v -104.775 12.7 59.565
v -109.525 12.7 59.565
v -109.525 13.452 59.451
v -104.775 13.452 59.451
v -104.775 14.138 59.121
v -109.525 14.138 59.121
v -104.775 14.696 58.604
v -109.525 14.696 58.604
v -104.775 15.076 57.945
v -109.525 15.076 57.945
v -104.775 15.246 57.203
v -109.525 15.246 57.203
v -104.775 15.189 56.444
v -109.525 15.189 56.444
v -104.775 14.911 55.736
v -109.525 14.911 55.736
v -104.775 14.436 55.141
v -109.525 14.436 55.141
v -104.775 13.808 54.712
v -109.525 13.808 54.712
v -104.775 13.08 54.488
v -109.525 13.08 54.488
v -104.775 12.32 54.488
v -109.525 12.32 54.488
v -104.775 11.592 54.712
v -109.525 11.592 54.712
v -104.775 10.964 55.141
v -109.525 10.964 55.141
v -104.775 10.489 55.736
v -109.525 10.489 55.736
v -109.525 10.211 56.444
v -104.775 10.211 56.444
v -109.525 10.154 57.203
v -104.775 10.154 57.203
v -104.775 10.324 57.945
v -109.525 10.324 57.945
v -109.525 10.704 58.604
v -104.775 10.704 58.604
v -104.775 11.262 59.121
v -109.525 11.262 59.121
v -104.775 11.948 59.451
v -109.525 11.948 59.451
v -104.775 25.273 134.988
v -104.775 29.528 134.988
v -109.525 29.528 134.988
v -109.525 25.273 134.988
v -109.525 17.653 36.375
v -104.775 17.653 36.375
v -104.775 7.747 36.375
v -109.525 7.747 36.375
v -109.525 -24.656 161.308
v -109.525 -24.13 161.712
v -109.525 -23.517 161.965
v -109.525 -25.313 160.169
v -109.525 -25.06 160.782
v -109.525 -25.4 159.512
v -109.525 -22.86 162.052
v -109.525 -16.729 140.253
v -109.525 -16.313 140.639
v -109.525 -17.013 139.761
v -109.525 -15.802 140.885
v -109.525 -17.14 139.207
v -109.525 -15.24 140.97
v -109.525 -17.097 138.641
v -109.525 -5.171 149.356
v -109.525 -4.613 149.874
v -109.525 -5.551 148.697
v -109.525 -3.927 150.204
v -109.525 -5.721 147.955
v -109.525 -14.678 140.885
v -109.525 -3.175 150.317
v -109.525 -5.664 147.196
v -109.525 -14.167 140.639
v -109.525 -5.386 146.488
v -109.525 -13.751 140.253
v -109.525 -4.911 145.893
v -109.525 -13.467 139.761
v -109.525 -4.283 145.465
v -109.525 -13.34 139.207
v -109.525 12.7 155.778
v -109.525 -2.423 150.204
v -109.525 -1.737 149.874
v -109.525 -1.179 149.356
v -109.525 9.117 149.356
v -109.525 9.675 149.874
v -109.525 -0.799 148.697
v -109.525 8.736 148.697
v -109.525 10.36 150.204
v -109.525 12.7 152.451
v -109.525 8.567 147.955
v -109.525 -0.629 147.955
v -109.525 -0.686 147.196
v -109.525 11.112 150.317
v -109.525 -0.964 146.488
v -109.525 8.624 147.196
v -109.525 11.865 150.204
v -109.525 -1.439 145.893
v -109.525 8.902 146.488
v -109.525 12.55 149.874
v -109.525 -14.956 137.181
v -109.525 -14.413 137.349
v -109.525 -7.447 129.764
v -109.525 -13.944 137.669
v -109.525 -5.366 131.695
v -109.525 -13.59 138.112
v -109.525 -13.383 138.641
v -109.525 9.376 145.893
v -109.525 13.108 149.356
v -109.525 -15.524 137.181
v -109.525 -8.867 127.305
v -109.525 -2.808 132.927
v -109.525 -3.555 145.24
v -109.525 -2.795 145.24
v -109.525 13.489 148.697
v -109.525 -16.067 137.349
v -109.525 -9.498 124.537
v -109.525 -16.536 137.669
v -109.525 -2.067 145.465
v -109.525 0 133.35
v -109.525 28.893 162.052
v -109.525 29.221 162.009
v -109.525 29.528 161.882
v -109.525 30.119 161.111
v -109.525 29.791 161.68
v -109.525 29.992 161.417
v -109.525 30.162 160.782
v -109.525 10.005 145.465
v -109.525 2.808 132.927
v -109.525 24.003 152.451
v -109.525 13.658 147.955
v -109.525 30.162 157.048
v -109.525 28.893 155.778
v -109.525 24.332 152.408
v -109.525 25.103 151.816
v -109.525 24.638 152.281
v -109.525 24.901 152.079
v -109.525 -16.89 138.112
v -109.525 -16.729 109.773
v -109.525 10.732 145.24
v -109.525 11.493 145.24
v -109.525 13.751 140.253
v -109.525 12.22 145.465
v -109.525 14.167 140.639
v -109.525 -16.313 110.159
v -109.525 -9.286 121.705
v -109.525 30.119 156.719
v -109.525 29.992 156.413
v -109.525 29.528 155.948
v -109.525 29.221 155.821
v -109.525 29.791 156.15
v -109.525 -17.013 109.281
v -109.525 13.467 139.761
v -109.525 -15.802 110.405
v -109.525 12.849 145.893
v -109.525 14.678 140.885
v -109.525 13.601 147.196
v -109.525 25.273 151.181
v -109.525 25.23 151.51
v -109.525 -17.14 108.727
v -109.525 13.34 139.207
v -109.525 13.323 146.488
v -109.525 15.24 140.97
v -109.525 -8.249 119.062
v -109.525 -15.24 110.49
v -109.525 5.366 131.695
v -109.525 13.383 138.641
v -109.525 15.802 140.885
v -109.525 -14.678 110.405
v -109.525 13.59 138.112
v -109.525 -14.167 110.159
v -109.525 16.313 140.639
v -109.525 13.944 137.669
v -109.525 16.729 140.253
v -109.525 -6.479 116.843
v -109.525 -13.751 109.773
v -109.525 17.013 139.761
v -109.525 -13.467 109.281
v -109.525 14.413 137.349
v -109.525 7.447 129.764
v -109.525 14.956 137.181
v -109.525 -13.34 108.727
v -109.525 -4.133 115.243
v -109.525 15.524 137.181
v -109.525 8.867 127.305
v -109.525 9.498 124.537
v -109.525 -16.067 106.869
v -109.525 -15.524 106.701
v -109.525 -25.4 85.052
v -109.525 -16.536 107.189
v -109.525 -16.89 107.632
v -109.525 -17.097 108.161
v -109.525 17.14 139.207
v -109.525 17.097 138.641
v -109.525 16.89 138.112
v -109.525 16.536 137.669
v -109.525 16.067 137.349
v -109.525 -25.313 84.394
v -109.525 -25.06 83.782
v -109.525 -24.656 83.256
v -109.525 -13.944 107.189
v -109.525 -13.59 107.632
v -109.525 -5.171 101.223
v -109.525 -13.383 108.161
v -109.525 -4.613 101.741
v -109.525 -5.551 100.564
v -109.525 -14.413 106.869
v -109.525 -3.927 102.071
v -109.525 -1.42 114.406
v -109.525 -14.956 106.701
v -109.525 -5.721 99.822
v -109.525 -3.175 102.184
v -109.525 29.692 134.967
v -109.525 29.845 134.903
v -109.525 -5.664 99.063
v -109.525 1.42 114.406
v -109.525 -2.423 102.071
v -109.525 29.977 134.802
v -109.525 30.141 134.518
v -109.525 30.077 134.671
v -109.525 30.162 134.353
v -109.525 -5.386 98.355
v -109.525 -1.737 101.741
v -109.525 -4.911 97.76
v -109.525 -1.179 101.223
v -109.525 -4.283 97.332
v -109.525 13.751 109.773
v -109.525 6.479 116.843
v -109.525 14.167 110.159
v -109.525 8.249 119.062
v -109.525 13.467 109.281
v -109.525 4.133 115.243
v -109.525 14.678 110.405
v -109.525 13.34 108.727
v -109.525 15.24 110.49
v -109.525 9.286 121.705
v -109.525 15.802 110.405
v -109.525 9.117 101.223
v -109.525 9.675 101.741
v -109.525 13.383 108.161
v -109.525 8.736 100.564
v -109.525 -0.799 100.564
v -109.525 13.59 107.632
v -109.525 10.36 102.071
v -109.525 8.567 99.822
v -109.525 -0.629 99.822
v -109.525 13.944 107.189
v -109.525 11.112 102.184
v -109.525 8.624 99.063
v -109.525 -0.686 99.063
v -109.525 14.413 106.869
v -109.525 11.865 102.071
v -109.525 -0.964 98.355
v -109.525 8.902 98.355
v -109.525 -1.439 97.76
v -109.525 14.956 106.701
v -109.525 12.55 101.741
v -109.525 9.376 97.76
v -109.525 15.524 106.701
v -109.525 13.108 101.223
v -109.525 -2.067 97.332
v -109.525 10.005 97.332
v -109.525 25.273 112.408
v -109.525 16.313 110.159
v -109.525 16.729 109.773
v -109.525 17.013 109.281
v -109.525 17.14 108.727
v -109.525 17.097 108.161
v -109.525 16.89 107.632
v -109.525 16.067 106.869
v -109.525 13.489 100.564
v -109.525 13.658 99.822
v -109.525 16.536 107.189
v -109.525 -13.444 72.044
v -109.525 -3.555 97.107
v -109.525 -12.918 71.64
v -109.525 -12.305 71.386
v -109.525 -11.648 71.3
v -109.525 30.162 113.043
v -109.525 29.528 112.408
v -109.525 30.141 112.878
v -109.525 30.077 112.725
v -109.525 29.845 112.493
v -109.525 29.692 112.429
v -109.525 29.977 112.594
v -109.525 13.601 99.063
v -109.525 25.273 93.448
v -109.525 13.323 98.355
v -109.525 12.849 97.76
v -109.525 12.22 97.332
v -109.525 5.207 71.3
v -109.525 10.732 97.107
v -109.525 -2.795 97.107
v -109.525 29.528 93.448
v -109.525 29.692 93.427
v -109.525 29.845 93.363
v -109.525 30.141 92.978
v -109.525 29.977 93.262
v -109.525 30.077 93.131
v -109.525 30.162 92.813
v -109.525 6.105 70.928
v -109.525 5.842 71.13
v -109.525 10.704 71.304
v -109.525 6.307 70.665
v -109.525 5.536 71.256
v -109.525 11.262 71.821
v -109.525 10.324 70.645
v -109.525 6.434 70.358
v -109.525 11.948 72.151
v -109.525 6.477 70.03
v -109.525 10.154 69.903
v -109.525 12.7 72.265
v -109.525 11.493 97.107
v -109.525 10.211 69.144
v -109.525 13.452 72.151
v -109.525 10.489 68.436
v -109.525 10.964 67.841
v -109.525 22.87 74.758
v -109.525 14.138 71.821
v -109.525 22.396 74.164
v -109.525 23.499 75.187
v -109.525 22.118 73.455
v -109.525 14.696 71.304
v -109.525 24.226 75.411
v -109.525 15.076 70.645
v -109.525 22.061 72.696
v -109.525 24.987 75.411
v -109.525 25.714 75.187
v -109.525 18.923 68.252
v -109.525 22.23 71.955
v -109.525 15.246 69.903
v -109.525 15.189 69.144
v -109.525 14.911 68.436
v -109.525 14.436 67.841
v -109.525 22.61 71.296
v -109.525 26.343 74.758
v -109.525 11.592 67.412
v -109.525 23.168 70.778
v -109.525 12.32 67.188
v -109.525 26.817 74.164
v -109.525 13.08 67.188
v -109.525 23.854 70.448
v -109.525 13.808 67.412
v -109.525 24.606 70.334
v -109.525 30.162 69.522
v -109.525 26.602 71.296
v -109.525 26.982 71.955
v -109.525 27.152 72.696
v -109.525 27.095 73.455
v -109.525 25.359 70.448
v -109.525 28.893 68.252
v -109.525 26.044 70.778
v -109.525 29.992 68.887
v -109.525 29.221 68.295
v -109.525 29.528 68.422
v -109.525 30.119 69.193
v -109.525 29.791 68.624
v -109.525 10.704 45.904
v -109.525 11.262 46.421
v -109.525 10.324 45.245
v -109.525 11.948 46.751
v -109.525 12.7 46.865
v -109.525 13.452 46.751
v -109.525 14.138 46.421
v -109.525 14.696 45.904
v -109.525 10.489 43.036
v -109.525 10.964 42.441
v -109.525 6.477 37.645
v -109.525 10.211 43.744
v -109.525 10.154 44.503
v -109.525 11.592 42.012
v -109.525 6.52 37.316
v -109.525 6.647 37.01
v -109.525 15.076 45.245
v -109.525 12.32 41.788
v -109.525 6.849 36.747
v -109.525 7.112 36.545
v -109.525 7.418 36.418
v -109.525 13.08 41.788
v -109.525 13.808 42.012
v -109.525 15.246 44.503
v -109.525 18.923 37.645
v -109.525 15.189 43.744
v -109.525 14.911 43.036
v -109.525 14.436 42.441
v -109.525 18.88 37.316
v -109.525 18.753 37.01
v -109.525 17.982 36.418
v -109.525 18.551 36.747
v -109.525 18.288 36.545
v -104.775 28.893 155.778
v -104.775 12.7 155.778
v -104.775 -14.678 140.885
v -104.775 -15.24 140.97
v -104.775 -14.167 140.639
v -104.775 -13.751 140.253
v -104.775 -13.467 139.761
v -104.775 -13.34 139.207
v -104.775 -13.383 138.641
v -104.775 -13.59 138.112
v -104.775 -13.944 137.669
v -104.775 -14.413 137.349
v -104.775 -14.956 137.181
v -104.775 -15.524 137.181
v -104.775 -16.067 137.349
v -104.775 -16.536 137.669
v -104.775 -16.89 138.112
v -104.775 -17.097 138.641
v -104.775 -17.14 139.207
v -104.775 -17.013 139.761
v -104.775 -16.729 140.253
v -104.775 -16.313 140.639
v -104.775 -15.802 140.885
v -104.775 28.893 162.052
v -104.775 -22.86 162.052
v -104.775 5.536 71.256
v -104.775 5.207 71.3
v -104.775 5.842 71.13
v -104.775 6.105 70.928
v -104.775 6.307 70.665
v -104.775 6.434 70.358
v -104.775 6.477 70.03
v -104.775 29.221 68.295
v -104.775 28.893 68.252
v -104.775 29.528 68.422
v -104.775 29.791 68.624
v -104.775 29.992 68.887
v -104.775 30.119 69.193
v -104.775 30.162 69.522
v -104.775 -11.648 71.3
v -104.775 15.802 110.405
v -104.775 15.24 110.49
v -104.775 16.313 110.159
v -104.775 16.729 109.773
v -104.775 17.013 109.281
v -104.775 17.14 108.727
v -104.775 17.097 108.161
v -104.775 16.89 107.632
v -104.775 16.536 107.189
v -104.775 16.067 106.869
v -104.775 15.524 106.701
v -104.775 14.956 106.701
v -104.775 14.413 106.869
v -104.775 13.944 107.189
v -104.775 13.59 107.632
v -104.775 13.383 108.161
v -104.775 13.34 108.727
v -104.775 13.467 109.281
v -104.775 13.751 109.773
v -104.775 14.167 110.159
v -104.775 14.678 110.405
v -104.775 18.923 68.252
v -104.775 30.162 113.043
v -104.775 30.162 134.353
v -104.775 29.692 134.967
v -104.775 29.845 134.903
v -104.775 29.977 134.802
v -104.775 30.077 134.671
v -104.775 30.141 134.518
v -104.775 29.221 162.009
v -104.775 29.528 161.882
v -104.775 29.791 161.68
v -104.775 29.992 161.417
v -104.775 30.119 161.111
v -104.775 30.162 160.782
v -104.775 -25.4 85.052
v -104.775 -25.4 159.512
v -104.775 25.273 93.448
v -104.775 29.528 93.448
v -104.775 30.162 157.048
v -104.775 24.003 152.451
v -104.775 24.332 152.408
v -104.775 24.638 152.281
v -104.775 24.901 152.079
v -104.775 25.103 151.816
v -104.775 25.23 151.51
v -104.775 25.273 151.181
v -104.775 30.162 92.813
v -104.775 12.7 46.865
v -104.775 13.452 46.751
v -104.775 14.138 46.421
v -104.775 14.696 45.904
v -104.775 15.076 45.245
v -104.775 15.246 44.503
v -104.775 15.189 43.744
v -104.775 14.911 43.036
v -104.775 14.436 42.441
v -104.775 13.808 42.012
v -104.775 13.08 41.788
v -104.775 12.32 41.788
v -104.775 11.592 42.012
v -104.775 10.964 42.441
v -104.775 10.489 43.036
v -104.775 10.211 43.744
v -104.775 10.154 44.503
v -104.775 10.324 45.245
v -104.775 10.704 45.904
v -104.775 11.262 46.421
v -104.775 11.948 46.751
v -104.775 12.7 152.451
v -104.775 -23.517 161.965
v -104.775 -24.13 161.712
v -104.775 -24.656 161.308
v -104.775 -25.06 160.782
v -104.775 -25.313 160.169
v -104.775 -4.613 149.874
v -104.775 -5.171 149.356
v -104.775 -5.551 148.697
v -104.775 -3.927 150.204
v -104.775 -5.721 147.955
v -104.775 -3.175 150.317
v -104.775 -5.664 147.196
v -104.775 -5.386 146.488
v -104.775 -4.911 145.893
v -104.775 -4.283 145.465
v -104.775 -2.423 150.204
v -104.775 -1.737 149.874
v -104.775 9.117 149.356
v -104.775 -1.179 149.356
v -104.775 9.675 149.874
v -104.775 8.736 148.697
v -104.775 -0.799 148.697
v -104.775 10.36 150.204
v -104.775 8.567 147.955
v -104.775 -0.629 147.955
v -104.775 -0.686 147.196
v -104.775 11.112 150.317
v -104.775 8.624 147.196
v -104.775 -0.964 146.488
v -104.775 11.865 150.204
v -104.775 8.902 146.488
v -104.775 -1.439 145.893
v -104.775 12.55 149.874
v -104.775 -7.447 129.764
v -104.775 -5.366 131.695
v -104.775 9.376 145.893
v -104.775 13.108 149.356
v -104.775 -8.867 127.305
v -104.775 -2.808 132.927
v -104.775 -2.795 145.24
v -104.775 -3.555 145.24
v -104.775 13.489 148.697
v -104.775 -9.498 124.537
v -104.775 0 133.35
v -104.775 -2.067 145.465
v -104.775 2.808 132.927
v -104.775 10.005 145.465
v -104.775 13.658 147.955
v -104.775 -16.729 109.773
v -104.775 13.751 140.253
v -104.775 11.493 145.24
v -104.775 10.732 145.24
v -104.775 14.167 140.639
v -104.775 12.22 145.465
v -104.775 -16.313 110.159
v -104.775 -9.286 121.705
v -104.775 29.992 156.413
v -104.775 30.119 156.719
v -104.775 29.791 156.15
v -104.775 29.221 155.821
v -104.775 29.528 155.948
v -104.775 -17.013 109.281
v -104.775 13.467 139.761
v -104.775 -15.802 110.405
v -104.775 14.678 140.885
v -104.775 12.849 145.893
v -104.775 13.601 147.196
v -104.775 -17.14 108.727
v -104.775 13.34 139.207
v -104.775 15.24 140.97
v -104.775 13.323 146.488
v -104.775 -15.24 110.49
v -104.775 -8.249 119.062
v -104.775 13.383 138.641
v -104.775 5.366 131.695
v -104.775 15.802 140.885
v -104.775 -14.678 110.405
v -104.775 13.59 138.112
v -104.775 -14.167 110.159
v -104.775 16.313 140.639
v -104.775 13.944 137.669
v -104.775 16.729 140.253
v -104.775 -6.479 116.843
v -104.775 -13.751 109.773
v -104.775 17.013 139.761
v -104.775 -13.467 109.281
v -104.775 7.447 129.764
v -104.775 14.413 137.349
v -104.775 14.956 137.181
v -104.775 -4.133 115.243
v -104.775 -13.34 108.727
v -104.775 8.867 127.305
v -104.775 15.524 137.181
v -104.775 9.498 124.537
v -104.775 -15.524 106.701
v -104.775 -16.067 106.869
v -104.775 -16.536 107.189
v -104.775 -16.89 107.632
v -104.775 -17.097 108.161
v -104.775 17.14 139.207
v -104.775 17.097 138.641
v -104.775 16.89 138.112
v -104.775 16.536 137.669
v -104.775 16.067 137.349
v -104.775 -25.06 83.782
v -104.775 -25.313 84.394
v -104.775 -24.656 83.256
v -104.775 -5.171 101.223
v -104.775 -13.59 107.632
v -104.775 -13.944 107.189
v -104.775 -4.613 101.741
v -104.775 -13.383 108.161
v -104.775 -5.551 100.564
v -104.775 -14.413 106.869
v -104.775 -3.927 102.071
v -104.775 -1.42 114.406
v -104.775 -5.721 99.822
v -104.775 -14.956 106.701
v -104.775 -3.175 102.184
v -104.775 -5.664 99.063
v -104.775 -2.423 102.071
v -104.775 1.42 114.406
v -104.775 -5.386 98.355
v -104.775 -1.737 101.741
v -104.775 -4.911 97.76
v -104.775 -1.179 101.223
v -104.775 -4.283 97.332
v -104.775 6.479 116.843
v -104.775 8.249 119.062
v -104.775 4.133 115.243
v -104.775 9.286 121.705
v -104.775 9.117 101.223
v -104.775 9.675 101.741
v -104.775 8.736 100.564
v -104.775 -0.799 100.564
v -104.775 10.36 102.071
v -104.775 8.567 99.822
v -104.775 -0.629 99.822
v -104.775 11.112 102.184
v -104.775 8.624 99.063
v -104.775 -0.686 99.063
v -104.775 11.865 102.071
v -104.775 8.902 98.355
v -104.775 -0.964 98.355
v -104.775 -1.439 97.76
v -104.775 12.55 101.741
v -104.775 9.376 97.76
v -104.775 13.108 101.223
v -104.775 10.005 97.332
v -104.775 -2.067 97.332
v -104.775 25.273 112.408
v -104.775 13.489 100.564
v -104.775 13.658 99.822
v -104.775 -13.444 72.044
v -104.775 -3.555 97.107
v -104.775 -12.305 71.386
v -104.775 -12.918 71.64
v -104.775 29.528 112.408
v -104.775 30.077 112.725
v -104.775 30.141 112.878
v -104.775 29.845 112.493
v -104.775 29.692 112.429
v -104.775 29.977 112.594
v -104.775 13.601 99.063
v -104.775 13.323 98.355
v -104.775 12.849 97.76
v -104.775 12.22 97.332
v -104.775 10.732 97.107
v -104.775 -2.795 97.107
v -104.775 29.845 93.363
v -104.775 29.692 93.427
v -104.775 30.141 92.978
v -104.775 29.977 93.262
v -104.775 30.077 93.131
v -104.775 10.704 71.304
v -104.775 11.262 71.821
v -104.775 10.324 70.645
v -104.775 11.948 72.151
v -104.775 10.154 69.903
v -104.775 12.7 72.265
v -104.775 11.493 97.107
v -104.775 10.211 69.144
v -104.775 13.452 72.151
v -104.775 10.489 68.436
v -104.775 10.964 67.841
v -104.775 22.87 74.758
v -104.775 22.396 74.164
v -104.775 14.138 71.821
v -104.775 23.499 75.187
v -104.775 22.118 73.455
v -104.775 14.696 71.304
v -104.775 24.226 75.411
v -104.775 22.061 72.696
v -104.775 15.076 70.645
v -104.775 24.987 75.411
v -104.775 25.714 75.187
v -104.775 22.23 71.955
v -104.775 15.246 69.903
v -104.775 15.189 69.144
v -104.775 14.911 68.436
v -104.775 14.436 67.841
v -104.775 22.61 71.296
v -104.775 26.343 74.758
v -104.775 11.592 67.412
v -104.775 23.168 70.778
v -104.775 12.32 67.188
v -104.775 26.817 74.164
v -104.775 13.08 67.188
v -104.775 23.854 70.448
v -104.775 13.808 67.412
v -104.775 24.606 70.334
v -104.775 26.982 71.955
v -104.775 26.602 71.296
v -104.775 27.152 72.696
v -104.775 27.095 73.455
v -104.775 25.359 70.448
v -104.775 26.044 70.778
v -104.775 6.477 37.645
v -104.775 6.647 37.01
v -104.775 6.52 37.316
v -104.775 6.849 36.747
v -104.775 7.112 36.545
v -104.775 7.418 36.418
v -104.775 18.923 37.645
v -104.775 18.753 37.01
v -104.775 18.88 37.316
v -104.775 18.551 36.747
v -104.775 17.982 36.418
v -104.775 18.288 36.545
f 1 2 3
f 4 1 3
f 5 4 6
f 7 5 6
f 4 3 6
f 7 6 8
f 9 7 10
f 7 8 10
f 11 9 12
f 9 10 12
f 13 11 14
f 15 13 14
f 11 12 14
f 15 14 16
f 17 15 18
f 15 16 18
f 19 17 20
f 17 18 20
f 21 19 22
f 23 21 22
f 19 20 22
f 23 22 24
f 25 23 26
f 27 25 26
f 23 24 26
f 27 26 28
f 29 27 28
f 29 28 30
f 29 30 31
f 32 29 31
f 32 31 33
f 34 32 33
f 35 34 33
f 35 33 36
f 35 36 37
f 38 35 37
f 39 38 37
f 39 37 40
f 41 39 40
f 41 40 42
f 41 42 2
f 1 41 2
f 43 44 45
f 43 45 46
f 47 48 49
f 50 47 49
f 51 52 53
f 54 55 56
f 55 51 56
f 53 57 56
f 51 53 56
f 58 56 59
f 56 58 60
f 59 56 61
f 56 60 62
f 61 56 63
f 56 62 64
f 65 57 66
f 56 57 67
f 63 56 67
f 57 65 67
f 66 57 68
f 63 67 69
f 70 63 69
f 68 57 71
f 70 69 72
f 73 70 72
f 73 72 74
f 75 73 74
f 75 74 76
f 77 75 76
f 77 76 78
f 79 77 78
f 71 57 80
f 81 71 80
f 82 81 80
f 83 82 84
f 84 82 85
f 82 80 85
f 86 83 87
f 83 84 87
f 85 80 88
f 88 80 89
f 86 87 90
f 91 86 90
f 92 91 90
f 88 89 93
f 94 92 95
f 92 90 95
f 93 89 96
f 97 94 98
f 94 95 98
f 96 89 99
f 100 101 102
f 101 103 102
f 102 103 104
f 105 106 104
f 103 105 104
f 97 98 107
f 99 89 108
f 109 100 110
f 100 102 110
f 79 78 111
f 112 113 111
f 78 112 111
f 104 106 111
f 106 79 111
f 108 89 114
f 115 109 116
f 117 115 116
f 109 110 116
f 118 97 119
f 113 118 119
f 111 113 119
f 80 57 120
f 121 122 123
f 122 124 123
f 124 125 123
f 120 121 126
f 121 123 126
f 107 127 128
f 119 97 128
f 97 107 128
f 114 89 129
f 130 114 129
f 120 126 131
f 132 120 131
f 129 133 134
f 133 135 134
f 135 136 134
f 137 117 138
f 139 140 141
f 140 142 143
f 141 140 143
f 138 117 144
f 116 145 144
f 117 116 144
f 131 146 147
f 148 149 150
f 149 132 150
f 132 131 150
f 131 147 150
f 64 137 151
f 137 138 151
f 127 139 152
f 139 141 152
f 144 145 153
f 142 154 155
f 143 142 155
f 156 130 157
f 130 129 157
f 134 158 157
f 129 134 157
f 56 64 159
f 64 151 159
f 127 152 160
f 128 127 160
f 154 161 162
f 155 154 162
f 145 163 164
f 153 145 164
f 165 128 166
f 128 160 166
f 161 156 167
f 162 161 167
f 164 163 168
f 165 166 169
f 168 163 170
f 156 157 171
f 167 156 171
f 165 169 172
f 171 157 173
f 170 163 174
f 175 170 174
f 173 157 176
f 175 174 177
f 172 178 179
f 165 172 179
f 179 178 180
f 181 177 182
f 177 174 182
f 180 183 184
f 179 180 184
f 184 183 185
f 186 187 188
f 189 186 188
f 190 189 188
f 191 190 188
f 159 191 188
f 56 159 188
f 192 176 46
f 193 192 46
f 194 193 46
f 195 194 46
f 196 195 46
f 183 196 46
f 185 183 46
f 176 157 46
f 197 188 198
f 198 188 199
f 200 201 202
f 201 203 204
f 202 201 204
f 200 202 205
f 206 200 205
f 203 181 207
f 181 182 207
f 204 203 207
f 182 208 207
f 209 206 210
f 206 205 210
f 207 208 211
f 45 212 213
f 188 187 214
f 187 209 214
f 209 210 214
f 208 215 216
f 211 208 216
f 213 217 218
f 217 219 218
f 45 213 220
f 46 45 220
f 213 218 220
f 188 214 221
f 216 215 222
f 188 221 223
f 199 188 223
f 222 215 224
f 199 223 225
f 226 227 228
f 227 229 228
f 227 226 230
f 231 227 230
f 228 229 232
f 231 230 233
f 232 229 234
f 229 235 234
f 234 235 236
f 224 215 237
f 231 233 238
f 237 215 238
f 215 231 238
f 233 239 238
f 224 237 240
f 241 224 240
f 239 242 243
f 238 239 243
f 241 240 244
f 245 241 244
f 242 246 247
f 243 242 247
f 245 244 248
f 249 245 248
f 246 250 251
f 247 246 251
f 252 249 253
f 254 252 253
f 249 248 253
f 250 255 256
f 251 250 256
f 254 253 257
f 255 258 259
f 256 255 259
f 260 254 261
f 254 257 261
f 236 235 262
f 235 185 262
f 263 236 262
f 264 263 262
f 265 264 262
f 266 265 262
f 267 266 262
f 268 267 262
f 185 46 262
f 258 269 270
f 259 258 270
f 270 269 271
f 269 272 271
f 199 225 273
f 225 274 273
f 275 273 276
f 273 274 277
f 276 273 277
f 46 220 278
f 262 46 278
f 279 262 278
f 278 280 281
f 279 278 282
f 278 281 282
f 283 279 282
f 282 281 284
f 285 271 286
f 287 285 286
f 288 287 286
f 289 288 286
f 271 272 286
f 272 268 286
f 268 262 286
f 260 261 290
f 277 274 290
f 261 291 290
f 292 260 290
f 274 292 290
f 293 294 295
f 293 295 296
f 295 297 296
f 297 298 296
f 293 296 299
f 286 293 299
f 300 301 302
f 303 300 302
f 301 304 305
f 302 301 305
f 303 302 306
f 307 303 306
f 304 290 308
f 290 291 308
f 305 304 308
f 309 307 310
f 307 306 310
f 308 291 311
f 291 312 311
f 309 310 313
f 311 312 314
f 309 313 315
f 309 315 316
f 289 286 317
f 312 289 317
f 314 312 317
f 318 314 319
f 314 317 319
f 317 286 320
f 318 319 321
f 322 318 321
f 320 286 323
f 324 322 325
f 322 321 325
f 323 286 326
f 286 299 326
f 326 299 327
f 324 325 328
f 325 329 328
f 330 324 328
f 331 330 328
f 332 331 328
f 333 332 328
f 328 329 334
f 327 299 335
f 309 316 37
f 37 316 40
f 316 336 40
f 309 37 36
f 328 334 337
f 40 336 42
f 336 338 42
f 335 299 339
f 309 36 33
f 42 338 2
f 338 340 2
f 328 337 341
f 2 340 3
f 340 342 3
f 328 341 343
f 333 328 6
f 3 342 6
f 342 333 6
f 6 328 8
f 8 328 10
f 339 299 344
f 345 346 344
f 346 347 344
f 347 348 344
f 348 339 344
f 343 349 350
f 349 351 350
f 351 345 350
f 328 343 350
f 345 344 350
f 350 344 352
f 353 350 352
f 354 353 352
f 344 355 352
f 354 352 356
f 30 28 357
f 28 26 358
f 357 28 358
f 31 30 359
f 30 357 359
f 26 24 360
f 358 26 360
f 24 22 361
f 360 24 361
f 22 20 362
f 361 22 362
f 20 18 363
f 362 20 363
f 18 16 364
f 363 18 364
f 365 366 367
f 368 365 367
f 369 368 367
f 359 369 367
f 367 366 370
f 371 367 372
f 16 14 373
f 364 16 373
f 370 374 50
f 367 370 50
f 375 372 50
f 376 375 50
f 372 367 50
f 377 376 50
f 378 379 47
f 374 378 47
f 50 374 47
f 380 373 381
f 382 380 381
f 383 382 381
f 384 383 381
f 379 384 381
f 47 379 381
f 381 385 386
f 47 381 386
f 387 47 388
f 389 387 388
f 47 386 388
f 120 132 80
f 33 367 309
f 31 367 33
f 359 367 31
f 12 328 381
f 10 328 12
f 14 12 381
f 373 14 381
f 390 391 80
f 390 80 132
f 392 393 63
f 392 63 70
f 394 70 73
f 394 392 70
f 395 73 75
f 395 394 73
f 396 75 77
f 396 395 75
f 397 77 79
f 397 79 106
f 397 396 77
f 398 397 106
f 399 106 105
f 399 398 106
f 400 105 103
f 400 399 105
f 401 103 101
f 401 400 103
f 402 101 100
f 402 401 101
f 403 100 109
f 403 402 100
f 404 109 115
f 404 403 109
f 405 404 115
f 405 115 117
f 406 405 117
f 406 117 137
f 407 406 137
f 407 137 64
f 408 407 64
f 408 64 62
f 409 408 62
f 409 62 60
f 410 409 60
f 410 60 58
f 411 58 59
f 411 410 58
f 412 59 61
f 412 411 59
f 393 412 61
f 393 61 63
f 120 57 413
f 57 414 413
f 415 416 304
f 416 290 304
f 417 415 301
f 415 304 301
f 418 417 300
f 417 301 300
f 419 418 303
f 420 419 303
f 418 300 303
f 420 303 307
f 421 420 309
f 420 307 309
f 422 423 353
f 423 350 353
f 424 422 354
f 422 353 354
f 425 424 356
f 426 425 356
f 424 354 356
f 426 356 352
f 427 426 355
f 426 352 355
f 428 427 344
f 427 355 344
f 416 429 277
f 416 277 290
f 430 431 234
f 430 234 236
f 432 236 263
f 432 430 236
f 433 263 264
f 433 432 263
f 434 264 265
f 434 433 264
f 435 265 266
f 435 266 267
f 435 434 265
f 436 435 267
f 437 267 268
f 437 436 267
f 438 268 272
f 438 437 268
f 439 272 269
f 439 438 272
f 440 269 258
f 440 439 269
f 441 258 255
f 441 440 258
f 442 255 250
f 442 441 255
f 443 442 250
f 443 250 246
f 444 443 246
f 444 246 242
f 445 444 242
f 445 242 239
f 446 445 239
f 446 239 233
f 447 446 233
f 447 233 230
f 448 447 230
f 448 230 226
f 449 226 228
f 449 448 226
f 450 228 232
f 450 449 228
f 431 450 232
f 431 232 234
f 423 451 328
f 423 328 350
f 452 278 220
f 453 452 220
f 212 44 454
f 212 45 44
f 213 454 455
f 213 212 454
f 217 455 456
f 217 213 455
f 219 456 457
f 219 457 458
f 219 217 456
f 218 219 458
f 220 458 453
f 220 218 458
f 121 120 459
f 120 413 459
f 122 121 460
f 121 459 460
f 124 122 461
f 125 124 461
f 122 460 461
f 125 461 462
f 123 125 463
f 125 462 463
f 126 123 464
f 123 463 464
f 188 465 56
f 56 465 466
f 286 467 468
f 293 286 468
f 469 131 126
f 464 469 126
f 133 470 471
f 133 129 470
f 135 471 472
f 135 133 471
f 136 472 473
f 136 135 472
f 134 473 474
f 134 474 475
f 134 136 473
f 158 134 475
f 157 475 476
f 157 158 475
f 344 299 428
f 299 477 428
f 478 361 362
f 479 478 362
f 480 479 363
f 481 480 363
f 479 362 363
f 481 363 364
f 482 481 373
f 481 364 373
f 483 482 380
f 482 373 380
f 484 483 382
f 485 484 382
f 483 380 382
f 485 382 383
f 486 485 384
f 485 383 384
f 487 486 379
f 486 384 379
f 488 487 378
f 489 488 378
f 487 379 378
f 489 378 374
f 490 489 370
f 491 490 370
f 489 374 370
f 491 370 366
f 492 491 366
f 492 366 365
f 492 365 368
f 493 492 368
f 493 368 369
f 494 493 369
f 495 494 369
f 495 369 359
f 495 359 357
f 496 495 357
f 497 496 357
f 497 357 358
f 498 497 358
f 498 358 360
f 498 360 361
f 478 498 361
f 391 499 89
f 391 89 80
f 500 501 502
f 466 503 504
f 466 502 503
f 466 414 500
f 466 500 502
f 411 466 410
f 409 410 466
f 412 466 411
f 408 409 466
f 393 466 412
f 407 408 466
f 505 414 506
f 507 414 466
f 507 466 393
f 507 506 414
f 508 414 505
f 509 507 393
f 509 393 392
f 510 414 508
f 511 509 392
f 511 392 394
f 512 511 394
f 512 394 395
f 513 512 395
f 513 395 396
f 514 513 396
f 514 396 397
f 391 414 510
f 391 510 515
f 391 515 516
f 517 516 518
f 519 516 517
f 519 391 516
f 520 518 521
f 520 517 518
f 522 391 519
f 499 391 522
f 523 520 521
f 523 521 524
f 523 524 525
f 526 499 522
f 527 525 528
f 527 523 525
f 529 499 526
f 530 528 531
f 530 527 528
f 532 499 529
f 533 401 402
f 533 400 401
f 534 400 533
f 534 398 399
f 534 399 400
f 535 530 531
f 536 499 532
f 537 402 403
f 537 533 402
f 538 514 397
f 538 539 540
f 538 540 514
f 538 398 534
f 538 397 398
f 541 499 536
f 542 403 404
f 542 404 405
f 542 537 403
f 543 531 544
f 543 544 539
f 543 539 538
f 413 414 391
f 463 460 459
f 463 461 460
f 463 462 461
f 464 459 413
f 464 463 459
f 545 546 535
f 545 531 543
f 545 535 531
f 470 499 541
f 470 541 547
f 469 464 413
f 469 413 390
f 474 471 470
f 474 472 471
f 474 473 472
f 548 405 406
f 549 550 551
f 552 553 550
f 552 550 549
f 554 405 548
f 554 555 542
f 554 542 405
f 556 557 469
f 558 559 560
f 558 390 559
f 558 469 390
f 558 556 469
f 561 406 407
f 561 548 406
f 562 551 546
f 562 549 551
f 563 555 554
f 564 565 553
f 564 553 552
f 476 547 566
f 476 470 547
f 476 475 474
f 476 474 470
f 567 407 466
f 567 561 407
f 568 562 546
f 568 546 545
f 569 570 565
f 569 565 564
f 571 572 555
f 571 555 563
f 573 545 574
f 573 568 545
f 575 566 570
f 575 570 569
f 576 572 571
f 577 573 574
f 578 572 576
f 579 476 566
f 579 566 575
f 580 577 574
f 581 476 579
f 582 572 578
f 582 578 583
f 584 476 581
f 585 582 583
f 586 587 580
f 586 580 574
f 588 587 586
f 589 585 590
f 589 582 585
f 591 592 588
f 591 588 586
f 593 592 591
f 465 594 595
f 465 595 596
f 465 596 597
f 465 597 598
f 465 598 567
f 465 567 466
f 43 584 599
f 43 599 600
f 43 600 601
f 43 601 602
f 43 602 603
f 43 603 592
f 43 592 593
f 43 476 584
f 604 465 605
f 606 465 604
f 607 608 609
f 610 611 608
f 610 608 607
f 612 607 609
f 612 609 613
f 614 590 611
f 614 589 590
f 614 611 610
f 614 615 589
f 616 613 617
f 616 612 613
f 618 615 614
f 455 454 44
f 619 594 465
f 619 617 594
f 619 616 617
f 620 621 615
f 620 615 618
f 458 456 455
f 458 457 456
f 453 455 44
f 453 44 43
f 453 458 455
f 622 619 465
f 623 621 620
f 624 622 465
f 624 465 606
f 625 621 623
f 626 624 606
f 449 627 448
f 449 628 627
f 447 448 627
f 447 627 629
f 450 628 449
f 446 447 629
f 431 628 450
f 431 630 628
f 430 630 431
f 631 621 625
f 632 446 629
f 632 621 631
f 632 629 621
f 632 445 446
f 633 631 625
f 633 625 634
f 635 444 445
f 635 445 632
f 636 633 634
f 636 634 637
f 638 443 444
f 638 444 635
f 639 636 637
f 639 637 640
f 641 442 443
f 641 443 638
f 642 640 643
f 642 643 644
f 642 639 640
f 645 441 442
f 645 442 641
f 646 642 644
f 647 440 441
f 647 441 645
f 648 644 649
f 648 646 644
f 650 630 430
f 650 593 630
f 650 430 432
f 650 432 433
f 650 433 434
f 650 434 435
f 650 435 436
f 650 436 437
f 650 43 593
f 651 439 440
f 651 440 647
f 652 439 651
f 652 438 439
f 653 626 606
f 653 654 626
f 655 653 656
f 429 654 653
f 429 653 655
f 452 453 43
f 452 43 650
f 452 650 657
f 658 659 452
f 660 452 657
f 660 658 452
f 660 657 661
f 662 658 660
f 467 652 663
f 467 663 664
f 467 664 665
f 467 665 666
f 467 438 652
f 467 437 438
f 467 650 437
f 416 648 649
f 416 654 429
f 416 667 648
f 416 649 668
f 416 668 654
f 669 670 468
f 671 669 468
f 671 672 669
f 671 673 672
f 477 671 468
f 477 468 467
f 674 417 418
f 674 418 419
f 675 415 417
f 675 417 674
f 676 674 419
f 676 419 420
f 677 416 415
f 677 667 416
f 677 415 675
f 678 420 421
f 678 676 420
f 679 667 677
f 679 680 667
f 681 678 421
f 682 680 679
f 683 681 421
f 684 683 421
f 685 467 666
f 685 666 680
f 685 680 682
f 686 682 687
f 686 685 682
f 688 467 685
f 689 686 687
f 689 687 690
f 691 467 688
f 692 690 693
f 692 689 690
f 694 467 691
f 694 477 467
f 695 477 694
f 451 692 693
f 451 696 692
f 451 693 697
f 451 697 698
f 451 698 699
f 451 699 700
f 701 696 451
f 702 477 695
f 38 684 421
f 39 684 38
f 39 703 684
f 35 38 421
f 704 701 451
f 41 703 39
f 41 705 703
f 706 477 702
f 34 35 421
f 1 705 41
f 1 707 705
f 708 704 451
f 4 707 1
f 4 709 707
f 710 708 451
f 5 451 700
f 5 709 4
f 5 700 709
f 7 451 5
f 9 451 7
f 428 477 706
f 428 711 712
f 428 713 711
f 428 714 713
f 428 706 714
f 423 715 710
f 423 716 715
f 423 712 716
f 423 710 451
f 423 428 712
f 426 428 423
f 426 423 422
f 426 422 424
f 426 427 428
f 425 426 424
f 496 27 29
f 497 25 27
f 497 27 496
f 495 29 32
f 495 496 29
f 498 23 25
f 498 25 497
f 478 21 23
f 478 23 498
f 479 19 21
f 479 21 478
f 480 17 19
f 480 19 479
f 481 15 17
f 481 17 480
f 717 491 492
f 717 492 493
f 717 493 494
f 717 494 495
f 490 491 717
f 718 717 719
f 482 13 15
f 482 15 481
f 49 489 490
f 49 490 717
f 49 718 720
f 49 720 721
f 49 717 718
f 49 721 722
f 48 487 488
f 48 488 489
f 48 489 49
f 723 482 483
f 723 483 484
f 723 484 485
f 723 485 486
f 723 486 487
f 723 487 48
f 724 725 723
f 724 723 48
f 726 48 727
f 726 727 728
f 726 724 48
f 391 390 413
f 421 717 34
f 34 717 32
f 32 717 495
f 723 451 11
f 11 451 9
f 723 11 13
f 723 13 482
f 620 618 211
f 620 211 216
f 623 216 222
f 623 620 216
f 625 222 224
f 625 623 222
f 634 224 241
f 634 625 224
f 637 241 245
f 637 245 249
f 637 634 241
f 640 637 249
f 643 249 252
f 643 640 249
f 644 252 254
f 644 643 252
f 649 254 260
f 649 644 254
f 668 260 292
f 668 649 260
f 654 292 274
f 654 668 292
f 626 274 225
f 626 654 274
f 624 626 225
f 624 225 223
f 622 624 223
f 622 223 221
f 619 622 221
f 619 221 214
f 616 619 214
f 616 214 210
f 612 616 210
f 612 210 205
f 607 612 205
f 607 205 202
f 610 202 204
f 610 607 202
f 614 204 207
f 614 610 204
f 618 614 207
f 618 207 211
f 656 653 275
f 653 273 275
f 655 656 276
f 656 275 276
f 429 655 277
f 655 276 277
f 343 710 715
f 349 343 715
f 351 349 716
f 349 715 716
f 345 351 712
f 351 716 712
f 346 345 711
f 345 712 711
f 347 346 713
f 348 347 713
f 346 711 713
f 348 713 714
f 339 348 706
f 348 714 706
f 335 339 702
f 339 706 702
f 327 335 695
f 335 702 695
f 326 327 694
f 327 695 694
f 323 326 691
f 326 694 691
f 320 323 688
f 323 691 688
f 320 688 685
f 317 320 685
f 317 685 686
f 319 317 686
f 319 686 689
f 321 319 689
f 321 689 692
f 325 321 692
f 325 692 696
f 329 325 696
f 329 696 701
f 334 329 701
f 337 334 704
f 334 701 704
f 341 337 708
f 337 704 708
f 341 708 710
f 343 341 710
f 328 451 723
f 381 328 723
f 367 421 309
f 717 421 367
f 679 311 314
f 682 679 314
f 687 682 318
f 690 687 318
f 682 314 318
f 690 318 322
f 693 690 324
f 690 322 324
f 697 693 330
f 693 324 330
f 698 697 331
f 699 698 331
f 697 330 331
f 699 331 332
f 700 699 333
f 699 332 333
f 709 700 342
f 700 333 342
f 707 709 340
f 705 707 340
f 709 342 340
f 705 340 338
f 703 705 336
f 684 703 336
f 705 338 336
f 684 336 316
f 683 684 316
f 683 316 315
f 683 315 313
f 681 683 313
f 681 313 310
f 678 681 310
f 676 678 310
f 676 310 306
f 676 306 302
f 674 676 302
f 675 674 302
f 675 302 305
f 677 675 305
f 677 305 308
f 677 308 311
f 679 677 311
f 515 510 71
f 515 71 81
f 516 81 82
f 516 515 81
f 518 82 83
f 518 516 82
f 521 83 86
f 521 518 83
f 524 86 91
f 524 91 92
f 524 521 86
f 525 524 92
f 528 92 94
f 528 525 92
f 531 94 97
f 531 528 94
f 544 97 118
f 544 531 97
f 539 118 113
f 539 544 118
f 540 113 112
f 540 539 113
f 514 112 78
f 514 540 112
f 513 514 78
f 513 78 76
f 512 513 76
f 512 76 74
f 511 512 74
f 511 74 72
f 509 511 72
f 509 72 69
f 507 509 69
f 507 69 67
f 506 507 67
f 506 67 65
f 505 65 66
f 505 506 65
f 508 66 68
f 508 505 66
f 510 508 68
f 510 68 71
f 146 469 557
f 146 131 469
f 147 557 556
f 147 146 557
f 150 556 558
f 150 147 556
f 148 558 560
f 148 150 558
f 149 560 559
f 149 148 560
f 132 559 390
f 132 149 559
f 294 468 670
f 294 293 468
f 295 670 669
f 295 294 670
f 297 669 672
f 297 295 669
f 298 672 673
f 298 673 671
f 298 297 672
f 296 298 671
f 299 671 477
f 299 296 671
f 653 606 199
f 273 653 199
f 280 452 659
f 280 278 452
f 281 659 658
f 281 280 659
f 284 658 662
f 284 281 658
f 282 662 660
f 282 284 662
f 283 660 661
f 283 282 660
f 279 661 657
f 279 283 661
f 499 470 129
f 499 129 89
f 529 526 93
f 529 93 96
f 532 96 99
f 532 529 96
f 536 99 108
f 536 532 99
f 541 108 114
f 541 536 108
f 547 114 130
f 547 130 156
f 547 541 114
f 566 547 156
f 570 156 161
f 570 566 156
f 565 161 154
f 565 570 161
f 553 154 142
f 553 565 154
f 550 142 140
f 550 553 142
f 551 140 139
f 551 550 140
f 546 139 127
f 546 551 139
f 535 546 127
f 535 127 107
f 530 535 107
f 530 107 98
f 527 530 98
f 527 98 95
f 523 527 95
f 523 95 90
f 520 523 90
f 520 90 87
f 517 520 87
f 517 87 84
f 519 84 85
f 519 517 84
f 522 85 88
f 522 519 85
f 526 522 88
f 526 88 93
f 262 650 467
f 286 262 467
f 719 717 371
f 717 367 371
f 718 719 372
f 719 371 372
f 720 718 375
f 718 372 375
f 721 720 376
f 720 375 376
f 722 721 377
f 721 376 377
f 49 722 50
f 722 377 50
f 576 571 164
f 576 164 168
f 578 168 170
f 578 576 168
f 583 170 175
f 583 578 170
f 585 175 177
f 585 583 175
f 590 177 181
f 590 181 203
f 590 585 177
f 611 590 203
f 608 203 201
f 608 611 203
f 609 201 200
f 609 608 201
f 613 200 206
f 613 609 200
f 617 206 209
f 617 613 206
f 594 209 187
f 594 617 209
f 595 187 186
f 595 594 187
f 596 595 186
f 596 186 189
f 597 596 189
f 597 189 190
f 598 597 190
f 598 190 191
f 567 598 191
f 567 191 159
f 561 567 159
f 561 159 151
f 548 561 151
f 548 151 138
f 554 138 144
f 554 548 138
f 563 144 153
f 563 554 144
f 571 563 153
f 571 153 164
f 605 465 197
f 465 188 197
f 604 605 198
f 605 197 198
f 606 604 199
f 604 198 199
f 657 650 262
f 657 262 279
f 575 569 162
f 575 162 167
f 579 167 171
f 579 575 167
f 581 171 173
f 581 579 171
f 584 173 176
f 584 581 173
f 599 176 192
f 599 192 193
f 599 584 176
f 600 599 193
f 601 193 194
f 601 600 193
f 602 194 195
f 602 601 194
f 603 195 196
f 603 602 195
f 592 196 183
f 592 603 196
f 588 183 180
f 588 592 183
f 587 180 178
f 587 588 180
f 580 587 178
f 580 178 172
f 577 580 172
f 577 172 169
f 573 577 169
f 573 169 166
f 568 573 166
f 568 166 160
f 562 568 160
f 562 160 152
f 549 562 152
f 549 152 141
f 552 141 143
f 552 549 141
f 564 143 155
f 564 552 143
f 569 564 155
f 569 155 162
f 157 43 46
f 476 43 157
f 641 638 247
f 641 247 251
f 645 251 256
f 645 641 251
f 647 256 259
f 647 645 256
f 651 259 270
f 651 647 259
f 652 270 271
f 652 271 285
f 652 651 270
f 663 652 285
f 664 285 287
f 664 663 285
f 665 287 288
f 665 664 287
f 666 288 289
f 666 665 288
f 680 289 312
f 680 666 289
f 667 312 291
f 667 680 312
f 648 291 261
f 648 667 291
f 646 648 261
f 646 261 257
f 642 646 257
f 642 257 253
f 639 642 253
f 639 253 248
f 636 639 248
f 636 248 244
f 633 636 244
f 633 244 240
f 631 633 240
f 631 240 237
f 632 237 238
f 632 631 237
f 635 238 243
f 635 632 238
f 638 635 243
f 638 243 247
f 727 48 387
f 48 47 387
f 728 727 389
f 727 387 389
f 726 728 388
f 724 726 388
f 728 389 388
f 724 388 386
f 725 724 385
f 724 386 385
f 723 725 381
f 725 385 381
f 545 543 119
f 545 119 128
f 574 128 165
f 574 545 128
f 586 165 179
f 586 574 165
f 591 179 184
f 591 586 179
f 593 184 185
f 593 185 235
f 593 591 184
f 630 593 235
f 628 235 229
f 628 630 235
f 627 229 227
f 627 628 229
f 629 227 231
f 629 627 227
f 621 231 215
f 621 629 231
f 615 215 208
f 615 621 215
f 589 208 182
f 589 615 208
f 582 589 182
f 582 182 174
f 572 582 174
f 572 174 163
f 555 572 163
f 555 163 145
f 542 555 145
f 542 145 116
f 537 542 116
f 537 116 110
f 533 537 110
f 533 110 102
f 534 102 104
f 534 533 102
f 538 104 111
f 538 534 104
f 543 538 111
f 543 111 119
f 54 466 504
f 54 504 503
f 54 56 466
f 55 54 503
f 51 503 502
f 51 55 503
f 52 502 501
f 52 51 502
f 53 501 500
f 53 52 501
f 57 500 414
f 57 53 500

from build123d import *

# Parameters (mm, degrees)
SKETCH6_R                   = 9.525
SKETCH6_R_2                 = 1.905
SKETCH6_R_3                 = 2.5527
SIDE_PLATE_EXTRUDE_DEPTH    = 4.7498
SKETCH15_R                  = 2.5527
CUSTOM_NUTSTRIP_HOLES_DEPTH = 5.7498
SKETCH43_W                  = 3.175
SKETCH43_H                  = 12.7
CUT_EXTRUDE19_DEPTH         = 5.7498
SKETCH73_W                  = 15.875
SKETCH73_H                  = 4.7625
SKETCH73_W_2                = 22.733
SKETCH73_W_3                = 6.35
BOSS_EXTRUDE28_DEPTH        = 4.7498
SKETCH108_W                 = 9.525
SKETCH108_H                 = 11.1125
SKETCH108_R                 = 2.5527
BOSS_EXTRUDE35_DEPTH        = 4.7498
SKETCH90_W                  = 18.959213894
SKETCH90_H                  = 4.8895
SKETCH90_W_2                = 34.925
SKETCH90_H_2                = 31.877
SIDE_PLATE_TOLERENCES_DEPTH = 5.7498
CHAMFER8_SIZE               = 12.7
FILLET15_R                  = 2.54
FILLET26_R                  = 1.27
FILLET29_R                  = 0.635


with BuildPart() as part:
    # Sketch6 → Side Plate Extrude (new body)
    with BuildSketch(Plane.ZY.offset(104.775)):
        Polygon((162.052, -25.4), (162.052, 25.4), (77.649686106, 25.4), (77.649686106, 19.05), (36.374686106, 19.05), (36.374686106, 6.35), (71.299686106, 6.35), (71.299686106, -25.4), align=None)
        with Locations((123.825, 0)):
            Circle(SKETCH6_R, mode=Mode.SUBTRACT)
        with Locations((108.585, -15.24)):
            Circle(SKETCH6_R_2, mode=Mode.SUBTRACT)
        with Locations((108.585, 15.24)):
            Circle(SKETCH6_R_2, mode=Mode.SUBTRACT)
        with Locations((139.065, 15.24)):
            Circle(SKETCH6_R_2, mode=Mode.SUBTRACT)
        with Locations((139.065, -15.24)):
            Circle(SKETCH6_R_2, mode=Mode.SUBTRACT)
        with Locations((147.7645, 11.1125)):
            Circle(SKETCH6_R_3, mode=Mode.SUBTRACT)
        with Locations((99.6315, 11.1125)):
            Circle(SKETCH6_R_3, mode=Mode.SUBTRACT)
        with Locations((99.6315, -3.175)):
            Circle(SKETCH6_R_3, mode=Mode.SUBTRACT)
        with Locations((147.7645, -3.175)):
            Circle(SKETCH6_R_3, mode=Mode.SUBTRACT)
    extrude(amount=SIDE_PLATE_EXTRUDE_DEPTH)

    # Sketch15 → Custom Nutstrip Holes (cut, through all)
    with BuildSketch(Plane.ZY.offset(109.5248)):
        with Locations((44.312186106, 12.7)):
            Circle(SKETCH15_R)
        with Locations((57.012186106, 12.7)):
            Circle(SKETCH15_R)
        with Locations((69.712186106, 12.7)):
            Circle(SKETCH15_R)
    extrude(amount=-CUSTOM_NUTSTRIP_HOLES_DEPTH, mode=Mode.SUBTRACT)

    # Sketch43 → Cut-Extrude19 (cut, through all)
    with BuildSketch(Plane.ZY.offset(109.5248)):
        with Locations((154.1145, 19.05)):
            Rectangle(SKETCH43_W, SKETCH43_H)
    extrude(amount=-CUT_EXTRUDE19_DEPTH, mode=Mode.SUBTRACT)

    # Sketch73 → Boss-Extrude28 (add, through all)
    with BuildSketch(Plane.ZY.offset(109.5248)):
        with Locations((85.587186106, 27.78125)):
            Rectangle(SKETCH73_W, SKETCH73_H)
        with Locations((123.698, 27.78125)):
            Rectangle(SKETCH73_W_2, SKETCH73_H)
        with Locations((158.877, 27.78125)):
            Rectangle(SKETCH73_W_3, SKETCH73_H)
    extrude(amount=-BOSS_EXTRUDE28_DEPTH)

    # Sketch108 → Boss-Extrude35 (add, through all)
    with BuildSketch(Plane(origin=(-104.775, 0, 0), x_dir=(0, 0, -1), z_dir=(1, 0, 0))):
        with Locations((-72.887186106, 24.60625)):
            Rectangle(SKETCH108_W, SKETCH108_H)
        with Locations((-72.887186106, 24.60625)):
            Circle(SKETCH108_R, mode=Mode.SUBTRACT)
    extrude(amount=-BOSS_EXTRUDE35_DEPTH)

    # Sketch90 → Side Plate Tolerences (cut, through all)
    with BuildSketch(Plane(origin=(-104.775, 0, 0), x_dir=(0, 0, -1), z_dir=(1, 0, 0))):
        Polygon((-152.4508, 12.7), (-155.7782, 12.7), (-155.7782, 30.1625), (-152.4508, 30.1625), (-134.9883, 30.1625), (-134.9883, 25.273), (-152.4508, 25.273), align=None)
        with Locations((-102.928093053, 27.71775)):
            Rectangle(SKETCH90_W, SKETCH90_H)
        Polygon((-68.124686106, 19.05), (-36.374686106, 19.05), (-36.374686106, 18.923), (-68.124686106, 18.923), (-68.251686106, 18.923), (-68.251686106, 30.1625), (-68.124686106, 30.1625), align=None)
        with Locations((-53.837186106, -9.4615)):
            Rectangle(SKETCH90_W_2, SKETCH90_H_2)
    extrude(amount=-SIDE_PLATE_TOLERENCES_DEPTH, mode=Mode.SUBTRACT)

    # Chamfer8
    chamfer8_edges = [part.edges().sort_by_distance(p)[0] for p in [
        (-107.1499, -25.4, 71.299686106),
    ]]
    chamfer(chamfer8_edges, length=CHAMFER8_SIZE)

    # Fillet15
    fillet15_edges = [part.edges().sort_by_distance(p)[0] for p in [
        (-107.1499, -25.4, 162.052),
        (-107.1499, -25.4, 83.999686106),
        (-107.1499, -12.7, 71.299686106),
    ]]
    fillet(fillet15_edges, radius=FILLET15_R)

    # Fillet26
    fillet26_edges = [part.edges().sort_by_distance(p)[0] for p in [
        (-107.1499, 30.1625, 162.052),
        (-107.1499, 30.1625, 155.7782),
        (-107.1499, 25.273, 152.4508),
        (-107.1499, 18.923, 36.374686106),
        (-107.1499, 30.1625, 68.251686106),
        (-107.1499, 6.477, 36.374686106),
        (-107.1499, 6.477, 71.299686106),
    ]]
    fillet(fillet26_edges, radius=FILLET26_R)

    # Fillet29
    fillet29_edges = [part.edges().sort_by_distance(p)[0] for p in [
        (-107.1499, 30.1625, 134.9883),
        (-107.1499, 30.1625, 112.4077),
        (-107.1499, 30.1625, 93.448486106),
    ]]
    fillet(fillet29_edges, radius=FILLET29_R)


solid = part.part
